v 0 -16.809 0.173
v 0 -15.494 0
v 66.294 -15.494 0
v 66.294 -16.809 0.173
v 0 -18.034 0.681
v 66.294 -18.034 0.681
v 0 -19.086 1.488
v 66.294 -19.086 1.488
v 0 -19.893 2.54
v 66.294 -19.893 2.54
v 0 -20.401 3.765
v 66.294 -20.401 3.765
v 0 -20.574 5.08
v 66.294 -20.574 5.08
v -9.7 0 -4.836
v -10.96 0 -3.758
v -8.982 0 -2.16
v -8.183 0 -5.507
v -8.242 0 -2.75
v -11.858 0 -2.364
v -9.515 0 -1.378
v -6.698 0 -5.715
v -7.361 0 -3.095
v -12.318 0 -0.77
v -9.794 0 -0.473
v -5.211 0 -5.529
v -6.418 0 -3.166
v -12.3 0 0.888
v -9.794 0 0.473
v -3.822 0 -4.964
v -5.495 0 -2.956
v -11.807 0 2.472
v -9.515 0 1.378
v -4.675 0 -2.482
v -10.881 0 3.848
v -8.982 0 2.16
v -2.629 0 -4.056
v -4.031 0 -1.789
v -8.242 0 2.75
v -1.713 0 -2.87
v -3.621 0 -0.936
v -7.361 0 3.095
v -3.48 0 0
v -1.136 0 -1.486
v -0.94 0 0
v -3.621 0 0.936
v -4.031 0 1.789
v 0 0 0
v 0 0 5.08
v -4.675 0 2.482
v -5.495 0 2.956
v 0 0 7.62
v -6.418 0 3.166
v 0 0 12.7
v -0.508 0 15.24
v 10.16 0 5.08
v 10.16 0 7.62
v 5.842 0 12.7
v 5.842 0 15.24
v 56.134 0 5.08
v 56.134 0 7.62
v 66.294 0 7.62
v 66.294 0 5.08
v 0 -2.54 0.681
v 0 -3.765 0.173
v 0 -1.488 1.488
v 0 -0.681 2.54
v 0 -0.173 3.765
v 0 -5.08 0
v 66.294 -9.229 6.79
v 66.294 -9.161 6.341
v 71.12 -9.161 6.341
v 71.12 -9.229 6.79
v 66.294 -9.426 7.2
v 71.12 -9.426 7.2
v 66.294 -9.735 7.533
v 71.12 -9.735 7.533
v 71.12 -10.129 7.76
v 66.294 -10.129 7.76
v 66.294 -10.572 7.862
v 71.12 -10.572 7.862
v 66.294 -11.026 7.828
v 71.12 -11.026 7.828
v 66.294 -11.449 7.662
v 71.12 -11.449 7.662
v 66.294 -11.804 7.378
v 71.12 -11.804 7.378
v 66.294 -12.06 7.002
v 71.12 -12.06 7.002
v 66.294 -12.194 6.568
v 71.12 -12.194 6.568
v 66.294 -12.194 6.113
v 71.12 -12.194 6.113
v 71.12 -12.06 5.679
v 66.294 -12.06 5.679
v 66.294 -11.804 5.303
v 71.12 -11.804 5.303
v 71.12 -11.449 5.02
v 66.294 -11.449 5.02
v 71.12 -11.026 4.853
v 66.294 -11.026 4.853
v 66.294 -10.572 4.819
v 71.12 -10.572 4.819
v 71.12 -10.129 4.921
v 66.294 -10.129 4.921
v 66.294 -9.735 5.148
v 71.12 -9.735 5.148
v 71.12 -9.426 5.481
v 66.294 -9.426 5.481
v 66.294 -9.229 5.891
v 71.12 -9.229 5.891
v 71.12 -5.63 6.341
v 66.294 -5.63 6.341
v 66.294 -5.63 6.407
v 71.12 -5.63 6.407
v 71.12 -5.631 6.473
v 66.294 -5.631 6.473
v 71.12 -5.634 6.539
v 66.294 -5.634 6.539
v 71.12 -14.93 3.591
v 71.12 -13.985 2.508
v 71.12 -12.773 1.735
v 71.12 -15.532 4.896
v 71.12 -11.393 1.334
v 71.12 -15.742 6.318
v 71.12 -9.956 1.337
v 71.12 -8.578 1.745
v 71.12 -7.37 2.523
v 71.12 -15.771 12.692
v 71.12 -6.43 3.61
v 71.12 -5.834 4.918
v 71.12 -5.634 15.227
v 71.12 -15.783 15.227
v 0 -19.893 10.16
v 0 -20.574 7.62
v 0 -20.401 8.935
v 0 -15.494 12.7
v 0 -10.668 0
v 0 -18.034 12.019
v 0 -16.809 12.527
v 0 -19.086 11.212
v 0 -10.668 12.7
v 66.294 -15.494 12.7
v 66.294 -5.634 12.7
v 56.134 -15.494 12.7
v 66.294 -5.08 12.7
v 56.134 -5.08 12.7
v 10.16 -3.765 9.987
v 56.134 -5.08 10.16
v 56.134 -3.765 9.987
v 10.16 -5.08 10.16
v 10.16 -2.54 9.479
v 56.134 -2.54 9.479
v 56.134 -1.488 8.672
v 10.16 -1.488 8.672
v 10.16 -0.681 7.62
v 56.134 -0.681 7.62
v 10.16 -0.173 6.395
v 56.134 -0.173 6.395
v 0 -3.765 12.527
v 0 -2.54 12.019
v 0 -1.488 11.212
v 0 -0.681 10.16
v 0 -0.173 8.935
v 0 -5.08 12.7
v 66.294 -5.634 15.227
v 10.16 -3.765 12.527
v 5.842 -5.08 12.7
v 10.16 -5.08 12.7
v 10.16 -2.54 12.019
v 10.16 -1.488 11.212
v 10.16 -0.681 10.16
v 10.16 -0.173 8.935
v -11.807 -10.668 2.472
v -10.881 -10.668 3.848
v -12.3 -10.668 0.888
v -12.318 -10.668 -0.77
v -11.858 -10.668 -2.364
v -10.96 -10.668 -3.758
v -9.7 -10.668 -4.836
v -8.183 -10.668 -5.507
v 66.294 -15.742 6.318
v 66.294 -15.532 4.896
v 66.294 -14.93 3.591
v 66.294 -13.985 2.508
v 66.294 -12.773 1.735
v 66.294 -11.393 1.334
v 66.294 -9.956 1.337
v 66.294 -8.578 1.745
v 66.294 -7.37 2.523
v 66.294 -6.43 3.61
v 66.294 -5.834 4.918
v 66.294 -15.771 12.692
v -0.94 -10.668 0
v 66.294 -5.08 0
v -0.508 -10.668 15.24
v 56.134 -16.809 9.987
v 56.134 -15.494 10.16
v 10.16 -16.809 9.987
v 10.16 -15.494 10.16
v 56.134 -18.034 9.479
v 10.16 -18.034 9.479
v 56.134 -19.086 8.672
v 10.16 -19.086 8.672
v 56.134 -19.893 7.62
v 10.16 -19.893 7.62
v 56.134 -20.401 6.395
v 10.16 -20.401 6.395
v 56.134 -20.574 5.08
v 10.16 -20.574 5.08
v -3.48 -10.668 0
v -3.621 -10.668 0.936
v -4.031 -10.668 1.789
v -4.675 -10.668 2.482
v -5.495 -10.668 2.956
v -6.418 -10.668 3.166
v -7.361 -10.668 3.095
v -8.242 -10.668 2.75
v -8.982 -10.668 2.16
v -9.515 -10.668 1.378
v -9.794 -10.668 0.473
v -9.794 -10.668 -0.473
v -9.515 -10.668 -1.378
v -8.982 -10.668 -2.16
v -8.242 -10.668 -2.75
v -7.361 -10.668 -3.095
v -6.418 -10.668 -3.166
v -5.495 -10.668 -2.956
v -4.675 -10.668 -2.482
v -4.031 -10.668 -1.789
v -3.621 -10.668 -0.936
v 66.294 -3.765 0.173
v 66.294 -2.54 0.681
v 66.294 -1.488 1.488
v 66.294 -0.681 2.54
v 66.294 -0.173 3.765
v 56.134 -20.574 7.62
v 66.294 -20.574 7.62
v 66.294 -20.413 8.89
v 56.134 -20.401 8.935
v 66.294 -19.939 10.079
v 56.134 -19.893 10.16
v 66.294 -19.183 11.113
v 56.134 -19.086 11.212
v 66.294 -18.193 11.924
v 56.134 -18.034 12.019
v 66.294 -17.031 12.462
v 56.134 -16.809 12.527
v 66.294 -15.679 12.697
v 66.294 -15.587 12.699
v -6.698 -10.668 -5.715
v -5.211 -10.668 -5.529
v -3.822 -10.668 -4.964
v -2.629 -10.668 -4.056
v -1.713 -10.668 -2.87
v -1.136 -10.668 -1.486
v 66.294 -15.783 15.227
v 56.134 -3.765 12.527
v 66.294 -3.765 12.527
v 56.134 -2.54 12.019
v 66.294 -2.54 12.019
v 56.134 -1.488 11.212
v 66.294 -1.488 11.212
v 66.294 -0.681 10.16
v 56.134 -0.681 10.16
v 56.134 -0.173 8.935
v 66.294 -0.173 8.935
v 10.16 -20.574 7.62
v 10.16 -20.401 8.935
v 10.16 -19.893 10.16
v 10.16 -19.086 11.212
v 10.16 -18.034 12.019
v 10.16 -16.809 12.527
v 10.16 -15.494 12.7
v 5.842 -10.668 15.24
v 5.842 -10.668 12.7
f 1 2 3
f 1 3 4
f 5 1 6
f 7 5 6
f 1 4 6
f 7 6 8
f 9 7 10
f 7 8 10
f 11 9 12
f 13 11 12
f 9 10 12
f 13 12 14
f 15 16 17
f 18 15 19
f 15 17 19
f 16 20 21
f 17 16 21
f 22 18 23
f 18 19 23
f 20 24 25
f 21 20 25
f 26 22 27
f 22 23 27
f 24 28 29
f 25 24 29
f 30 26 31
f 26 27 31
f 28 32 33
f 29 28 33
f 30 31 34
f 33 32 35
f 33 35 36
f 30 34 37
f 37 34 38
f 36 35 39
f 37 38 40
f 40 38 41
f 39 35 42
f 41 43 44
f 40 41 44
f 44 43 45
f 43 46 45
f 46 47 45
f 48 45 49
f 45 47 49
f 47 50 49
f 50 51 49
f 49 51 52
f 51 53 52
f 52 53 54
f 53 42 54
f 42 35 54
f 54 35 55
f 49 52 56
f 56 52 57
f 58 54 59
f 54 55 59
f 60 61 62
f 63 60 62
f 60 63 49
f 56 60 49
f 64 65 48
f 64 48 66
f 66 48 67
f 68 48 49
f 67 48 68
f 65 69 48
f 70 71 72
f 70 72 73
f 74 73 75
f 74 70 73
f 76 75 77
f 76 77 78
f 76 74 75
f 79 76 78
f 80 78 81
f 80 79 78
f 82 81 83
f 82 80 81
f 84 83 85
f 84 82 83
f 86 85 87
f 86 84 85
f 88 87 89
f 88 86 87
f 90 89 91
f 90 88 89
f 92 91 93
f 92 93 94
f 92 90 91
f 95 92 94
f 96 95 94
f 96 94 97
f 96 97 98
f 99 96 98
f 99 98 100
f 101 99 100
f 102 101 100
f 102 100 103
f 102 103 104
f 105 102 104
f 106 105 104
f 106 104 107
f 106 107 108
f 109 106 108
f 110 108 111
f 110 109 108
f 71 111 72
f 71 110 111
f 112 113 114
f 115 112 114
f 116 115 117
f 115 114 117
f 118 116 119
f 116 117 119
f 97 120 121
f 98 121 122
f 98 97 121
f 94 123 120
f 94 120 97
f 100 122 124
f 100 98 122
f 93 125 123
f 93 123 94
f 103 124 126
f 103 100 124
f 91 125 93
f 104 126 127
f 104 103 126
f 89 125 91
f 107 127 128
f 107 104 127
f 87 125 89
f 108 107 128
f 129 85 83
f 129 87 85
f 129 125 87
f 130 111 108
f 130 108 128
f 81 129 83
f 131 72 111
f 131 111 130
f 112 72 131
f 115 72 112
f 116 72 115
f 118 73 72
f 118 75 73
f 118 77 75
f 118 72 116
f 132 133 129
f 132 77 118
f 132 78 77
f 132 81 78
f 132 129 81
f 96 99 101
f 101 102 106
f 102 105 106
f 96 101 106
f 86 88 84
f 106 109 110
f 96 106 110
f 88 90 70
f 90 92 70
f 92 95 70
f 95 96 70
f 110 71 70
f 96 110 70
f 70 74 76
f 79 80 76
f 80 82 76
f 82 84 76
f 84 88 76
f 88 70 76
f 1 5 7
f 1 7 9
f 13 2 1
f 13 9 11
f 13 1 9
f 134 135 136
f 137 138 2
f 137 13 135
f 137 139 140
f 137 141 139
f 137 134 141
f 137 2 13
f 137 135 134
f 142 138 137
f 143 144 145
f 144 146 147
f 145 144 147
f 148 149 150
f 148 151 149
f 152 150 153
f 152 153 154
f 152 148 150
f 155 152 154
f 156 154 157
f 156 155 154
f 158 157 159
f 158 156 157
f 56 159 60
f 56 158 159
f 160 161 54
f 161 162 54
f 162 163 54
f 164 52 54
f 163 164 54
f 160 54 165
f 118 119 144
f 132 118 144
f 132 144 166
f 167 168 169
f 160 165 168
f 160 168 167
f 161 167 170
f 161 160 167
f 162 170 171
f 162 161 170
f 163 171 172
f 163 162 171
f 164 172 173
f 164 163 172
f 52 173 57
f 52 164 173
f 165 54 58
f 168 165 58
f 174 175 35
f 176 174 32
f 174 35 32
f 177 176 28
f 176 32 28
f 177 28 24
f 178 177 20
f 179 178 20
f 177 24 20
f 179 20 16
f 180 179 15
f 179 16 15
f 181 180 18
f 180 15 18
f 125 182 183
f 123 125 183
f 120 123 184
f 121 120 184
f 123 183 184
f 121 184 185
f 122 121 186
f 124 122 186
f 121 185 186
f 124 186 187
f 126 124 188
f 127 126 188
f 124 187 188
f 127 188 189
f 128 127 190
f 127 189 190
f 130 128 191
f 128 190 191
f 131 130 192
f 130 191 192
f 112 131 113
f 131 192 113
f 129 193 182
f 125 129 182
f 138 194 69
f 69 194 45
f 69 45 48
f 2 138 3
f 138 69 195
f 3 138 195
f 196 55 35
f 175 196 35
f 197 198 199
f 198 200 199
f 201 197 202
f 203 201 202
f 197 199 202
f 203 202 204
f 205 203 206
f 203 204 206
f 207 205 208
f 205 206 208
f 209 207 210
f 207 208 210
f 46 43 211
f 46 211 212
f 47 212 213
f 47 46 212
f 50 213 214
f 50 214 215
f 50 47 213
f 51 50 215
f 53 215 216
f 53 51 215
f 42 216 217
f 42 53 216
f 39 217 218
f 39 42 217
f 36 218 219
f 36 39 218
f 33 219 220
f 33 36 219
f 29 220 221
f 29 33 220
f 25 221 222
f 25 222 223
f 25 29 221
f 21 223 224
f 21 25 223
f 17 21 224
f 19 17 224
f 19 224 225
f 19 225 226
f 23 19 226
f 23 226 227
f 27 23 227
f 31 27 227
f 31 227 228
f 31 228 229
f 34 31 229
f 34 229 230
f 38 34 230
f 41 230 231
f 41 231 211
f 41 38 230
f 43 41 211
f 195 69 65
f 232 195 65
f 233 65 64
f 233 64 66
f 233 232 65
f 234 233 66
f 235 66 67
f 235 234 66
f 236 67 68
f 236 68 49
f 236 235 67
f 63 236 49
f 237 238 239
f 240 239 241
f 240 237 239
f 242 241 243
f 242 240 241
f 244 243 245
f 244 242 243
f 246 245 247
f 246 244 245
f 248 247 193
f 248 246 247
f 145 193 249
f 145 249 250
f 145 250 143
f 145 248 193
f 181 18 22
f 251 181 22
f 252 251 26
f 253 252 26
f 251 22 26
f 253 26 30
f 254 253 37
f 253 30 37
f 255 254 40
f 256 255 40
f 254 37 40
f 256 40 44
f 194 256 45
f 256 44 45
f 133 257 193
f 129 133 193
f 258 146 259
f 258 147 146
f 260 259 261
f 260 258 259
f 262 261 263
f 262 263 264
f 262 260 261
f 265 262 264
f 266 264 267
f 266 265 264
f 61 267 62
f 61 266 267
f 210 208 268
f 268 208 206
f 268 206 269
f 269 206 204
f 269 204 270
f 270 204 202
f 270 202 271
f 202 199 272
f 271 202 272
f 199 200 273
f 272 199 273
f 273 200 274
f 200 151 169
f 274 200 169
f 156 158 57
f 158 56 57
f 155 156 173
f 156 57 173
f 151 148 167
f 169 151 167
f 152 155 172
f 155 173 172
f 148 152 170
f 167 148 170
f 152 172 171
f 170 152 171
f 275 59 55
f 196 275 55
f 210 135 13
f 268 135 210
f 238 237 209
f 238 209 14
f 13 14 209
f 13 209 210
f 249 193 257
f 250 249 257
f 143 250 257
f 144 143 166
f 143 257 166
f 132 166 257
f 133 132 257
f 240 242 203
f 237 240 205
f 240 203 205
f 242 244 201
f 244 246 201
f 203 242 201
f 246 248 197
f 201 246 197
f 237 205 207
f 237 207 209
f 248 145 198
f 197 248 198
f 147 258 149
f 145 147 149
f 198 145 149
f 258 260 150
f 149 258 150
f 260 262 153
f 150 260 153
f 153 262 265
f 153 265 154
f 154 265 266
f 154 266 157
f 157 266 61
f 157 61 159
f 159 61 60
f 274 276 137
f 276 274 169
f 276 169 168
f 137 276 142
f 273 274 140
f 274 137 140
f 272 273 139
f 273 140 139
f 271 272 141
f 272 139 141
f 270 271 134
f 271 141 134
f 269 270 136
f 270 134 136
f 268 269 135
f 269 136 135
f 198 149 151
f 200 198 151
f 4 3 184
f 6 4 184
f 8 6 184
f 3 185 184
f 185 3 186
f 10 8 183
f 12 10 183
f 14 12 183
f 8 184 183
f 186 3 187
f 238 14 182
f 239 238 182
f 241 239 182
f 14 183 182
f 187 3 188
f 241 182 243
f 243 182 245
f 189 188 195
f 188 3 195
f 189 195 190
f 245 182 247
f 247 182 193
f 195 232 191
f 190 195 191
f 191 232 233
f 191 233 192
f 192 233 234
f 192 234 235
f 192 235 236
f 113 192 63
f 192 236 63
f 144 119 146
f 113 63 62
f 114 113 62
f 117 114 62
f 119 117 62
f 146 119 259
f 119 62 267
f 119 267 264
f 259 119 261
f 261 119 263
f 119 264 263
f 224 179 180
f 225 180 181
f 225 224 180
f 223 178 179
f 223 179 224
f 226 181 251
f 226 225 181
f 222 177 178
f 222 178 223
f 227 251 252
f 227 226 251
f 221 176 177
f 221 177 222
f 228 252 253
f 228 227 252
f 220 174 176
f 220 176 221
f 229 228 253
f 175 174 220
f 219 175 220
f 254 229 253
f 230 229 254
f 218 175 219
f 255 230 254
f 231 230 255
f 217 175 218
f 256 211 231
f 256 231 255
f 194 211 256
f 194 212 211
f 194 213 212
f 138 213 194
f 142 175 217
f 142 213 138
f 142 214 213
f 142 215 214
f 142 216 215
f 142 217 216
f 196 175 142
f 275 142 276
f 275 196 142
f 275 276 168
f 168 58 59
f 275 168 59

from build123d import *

# Parameters (mm, degrees)
F0_W     = 5.842
F0_H     = 12.7
F1_DEPTH = 20.574
F2_R     = 5.08
F3_R     = 5.07999
F0_R     = 3.175
F4_DEPTH = 10.668
F5_R     = 1.5253482573
F6_DEPTH = 4.826


# Not quite as in the source:
# - a fillet or chamfer is up to 0.001 mm smaller than in the source, because OpenCascade refuses the exact size


with BuildPart() as f1:
    # F0 (on Front) → F1 (new body)
    with BuildSketch(Plane.XZ):
        Polygon((5.842, 12.7), (5.842, 0), (66.294, 0), (66.294, 12.7), (56.134, 12.7), (56.134, 10.16), (10.16, 10.16), (10.16, 12.7), align=None)
        with Locations((2.921, 6.35)):
            Rectangle(F0_W, F0_H)
    extrude(amount=F1_DEPTH)

    # F2
    f2_edges = [f1.edges().sort_by_distance(p)[0] for p in [
        (33.147, 0, 10.16),
        (33.147, -20.574, 10.16),
    ]]
    fillet(f2_edges, radius=F2_R)

    # F3 (radius 5.08 in the source; OpenCascade refuses exactly that, so slightly less here)
    f3_edges = [f1.edges().sort_by_distance(p)[0] for p in [
        (33.147, 0, 0),
        (61.214, 0, 12.7),
        (61.214, -20.574, 12.7),
        (5.08, 0, 12.7),
        (5.08, -20.574, 12.7),
        (33.147, -20.574, 0),
    ]]
    fillet(f3_edges, radius=F3_R)

    # F0 (on Front) → F4 (join)
    with BuildSketch(Plane.XZ):
        with BuildLine():
            ThreePointArc((-8.1826630726, -5.5069827884), (-3.1957909266, -4.5493385486), (-0.9398, 0))
            ThreePointArc((-0.9398, 0), (-4.5919612295, 5.3297205562), (-10.8806298187, 3.8475430269))
            ThreePointArc((-10.8806298187, 3.8475430269), (-12.1459778134, -1.5837270034), (-8.1826630726, -5.5069827884))
        make_face()
        with Locations((-6.6548, 0)):
            Circle(F0_R, mode=Mode.SUBTRACT)
        with BuildLine():
            Line((-0.9398, 0), (0, 0))
            Line((0, 0), (0, 12.7))
            Line((0, 12.7), (5.842, 12.7))
            Line((5.842, 12.7), (5.842, 15.24))
            Line((5.842, 15.24), (-0.508, 15.24))
            Line((-0.508, 15.24), (-10.8806298187, 3.8475430269))
            ThreePointArc((-10.8806298187, 3.8475430269), (-4.5919612295, 5.3297205562), (-0.9398, 0))
        make_face()
    extrude(amount=F4_DEPTH)

    # F5 (on face) → F6 (join)
    with BuildSketch(Plane.YZ.offset(66.294)):
        with BuildLine():
            Line((-15.49401, 12.7), (-5.6335453628, 12.7))
            Line((-5.6335453628, 12.7), (-5.6335453628, 15.2267941305))
            Line((-5.6335453628, 15.2267941305), (-14.7798256949, 15.2267941305))
            Line((-14.7798256949, 15.2267941305), (-15.7828871161, 15.2267941305))
            Line((-15.7828871161, 15.2267941305), (-15.7713881355, 12.6924216326))
            ThreePointArc((-15.7713881355, 12.6924216326), (-15.632750821, 12.6981050547), (-15.49401, 12.7))
        make_face()
        with BuildLine():
            ThreePointArc((-15.7424642816, 6.3176113686), (-10.7967240539, 11.3957731119), (-5.6335453628, 6.5388544493))
            Line((-5.6335453628, 6.5388544493), (-5.6335453628, 12.7))
            Line((-5.6335453628, 12.7), (-15.49401, 12.7))
            ThreePointArc((-15.49401, 12.7), (-15.632750821, 12.6981050547), (-15.7713881355, 12.6924216326))
            Line((-15.7713881355, 12.6924216326), (-15.7424642816, 6.3176113686))
        make_face()
        with BuildLine():
            ThreePointArc((-15.7424642816, 6.3176113686), (-10.6746149155, 1.2841357749), (-5.6296554142, 6.3405532201))
            ThreePointArc((-5.6296554142, 6.3405532201), (-5.6306279949, 6.4397229095), (-5.6335453628, 6.5388544493))
            ThreePointArc((-5.6335453628, 6.5388544493), (-10.7967240539, 11.3957731119), (-15.7424642816, 6.3176113686))
        make_face()
        with Locations((-10.6860858708, 6.3405532201)):
            Circle(F5_R, mode=Mode.SUBTRACT)
    extrude(amount=F6_DEPTH)


solid = f1.part
